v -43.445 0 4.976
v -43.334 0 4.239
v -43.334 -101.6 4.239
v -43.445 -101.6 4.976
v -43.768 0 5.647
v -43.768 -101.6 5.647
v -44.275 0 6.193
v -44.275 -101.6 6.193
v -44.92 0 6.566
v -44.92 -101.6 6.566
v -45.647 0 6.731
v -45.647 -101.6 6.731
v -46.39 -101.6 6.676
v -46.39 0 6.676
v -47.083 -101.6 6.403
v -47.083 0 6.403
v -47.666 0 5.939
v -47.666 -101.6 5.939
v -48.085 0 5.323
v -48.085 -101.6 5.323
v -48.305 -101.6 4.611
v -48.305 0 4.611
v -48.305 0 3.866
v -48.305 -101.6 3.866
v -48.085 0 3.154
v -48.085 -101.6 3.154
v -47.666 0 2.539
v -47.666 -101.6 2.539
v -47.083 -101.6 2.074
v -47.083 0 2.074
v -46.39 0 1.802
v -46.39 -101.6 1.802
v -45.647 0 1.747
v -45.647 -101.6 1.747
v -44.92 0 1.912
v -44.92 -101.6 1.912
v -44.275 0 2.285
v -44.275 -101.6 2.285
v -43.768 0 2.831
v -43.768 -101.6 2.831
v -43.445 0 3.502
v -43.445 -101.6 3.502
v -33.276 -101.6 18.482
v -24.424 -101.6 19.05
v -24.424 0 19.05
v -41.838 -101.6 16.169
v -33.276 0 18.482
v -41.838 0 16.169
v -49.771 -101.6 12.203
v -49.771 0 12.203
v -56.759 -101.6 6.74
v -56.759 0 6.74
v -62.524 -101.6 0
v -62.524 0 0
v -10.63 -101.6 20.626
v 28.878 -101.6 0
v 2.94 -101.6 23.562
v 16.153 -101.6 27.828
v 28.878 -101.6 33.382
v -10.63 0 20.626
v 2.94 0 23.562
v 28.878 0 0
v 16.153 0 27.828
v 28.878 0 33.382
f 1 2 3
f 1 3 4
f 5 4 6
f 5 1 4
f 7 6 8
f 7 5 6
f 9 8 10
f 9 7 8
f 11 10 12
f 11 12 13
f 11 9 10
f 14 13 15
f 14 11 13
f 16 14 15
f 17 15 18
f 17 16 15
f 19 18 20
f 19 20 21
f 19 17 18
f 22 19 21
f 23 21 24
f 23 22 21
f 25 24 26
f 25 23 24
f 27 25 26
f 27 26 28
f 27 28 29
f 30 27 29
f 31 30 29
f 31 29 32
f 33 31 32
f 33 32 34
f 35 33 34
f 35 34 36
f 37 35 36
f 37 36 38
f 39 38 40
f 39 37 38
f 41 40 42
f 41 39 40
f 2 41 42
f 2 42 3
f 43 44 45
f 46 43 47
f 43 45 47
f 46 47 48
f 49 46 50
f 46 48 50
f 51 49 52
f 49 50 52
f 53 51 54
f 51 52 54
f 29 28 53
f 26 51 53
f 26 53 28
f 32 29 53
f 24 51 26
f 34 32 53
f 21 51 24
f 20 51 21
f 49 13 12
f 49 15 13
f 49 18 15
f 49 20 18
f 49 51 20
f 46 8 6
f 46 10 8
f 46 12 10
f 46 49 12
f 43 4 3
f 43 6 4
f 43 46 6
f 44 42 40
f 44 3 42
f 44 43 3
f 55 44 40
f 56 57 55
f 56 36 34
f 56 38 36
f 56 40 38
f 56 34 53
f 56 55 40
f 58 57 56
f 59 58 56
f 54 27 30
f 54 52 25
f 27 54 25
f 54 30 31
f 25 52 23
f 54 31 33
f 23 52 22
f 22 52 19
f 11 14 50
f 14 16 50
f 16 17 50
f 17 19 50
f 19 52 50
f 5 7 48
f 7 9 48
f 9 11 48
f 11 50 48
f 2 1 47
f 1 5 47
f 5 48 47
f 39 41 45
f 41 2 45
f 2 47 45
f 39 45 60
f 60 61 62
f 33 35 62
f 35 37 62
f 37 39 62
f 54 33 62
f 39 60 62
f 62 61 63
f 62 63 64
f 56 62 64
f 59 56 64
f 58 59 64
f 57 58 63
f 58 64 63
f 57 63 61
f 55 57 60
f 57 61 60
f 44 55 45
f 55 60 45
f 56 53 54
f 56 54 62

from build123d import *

# Parameters (mm, degrees)
F0_R     = 2.49938
F1_DEPTH = 101.6


with BuildPart() as f1:
    # F0 (on Front) → F1 (new body)
    with BuildSketch(Plane.XZ):
        with BuildLine():
            ThreePointArc((-24.424371, 19.05), (-45.903919, 14.384096), (-62.524371, 0))
            Line((-62.524371, 0), (-24.424371, 0))
            Line((-24.424371, 0), (28.877782, 0))
            Line((28.877782, 0), (28.877782, 33.381656))
            ThreePointArc((28.877782, 33.381656), (2.940295, 23.561851), (-24.424371, 19.05))
        make_face()
        with Locations((-45.833543, 4.23894)):
            Circle(F0_R, mode=Mode.SUBTRACT)
    extrude(amount=F1_DEPTH)


solid = f1.part
